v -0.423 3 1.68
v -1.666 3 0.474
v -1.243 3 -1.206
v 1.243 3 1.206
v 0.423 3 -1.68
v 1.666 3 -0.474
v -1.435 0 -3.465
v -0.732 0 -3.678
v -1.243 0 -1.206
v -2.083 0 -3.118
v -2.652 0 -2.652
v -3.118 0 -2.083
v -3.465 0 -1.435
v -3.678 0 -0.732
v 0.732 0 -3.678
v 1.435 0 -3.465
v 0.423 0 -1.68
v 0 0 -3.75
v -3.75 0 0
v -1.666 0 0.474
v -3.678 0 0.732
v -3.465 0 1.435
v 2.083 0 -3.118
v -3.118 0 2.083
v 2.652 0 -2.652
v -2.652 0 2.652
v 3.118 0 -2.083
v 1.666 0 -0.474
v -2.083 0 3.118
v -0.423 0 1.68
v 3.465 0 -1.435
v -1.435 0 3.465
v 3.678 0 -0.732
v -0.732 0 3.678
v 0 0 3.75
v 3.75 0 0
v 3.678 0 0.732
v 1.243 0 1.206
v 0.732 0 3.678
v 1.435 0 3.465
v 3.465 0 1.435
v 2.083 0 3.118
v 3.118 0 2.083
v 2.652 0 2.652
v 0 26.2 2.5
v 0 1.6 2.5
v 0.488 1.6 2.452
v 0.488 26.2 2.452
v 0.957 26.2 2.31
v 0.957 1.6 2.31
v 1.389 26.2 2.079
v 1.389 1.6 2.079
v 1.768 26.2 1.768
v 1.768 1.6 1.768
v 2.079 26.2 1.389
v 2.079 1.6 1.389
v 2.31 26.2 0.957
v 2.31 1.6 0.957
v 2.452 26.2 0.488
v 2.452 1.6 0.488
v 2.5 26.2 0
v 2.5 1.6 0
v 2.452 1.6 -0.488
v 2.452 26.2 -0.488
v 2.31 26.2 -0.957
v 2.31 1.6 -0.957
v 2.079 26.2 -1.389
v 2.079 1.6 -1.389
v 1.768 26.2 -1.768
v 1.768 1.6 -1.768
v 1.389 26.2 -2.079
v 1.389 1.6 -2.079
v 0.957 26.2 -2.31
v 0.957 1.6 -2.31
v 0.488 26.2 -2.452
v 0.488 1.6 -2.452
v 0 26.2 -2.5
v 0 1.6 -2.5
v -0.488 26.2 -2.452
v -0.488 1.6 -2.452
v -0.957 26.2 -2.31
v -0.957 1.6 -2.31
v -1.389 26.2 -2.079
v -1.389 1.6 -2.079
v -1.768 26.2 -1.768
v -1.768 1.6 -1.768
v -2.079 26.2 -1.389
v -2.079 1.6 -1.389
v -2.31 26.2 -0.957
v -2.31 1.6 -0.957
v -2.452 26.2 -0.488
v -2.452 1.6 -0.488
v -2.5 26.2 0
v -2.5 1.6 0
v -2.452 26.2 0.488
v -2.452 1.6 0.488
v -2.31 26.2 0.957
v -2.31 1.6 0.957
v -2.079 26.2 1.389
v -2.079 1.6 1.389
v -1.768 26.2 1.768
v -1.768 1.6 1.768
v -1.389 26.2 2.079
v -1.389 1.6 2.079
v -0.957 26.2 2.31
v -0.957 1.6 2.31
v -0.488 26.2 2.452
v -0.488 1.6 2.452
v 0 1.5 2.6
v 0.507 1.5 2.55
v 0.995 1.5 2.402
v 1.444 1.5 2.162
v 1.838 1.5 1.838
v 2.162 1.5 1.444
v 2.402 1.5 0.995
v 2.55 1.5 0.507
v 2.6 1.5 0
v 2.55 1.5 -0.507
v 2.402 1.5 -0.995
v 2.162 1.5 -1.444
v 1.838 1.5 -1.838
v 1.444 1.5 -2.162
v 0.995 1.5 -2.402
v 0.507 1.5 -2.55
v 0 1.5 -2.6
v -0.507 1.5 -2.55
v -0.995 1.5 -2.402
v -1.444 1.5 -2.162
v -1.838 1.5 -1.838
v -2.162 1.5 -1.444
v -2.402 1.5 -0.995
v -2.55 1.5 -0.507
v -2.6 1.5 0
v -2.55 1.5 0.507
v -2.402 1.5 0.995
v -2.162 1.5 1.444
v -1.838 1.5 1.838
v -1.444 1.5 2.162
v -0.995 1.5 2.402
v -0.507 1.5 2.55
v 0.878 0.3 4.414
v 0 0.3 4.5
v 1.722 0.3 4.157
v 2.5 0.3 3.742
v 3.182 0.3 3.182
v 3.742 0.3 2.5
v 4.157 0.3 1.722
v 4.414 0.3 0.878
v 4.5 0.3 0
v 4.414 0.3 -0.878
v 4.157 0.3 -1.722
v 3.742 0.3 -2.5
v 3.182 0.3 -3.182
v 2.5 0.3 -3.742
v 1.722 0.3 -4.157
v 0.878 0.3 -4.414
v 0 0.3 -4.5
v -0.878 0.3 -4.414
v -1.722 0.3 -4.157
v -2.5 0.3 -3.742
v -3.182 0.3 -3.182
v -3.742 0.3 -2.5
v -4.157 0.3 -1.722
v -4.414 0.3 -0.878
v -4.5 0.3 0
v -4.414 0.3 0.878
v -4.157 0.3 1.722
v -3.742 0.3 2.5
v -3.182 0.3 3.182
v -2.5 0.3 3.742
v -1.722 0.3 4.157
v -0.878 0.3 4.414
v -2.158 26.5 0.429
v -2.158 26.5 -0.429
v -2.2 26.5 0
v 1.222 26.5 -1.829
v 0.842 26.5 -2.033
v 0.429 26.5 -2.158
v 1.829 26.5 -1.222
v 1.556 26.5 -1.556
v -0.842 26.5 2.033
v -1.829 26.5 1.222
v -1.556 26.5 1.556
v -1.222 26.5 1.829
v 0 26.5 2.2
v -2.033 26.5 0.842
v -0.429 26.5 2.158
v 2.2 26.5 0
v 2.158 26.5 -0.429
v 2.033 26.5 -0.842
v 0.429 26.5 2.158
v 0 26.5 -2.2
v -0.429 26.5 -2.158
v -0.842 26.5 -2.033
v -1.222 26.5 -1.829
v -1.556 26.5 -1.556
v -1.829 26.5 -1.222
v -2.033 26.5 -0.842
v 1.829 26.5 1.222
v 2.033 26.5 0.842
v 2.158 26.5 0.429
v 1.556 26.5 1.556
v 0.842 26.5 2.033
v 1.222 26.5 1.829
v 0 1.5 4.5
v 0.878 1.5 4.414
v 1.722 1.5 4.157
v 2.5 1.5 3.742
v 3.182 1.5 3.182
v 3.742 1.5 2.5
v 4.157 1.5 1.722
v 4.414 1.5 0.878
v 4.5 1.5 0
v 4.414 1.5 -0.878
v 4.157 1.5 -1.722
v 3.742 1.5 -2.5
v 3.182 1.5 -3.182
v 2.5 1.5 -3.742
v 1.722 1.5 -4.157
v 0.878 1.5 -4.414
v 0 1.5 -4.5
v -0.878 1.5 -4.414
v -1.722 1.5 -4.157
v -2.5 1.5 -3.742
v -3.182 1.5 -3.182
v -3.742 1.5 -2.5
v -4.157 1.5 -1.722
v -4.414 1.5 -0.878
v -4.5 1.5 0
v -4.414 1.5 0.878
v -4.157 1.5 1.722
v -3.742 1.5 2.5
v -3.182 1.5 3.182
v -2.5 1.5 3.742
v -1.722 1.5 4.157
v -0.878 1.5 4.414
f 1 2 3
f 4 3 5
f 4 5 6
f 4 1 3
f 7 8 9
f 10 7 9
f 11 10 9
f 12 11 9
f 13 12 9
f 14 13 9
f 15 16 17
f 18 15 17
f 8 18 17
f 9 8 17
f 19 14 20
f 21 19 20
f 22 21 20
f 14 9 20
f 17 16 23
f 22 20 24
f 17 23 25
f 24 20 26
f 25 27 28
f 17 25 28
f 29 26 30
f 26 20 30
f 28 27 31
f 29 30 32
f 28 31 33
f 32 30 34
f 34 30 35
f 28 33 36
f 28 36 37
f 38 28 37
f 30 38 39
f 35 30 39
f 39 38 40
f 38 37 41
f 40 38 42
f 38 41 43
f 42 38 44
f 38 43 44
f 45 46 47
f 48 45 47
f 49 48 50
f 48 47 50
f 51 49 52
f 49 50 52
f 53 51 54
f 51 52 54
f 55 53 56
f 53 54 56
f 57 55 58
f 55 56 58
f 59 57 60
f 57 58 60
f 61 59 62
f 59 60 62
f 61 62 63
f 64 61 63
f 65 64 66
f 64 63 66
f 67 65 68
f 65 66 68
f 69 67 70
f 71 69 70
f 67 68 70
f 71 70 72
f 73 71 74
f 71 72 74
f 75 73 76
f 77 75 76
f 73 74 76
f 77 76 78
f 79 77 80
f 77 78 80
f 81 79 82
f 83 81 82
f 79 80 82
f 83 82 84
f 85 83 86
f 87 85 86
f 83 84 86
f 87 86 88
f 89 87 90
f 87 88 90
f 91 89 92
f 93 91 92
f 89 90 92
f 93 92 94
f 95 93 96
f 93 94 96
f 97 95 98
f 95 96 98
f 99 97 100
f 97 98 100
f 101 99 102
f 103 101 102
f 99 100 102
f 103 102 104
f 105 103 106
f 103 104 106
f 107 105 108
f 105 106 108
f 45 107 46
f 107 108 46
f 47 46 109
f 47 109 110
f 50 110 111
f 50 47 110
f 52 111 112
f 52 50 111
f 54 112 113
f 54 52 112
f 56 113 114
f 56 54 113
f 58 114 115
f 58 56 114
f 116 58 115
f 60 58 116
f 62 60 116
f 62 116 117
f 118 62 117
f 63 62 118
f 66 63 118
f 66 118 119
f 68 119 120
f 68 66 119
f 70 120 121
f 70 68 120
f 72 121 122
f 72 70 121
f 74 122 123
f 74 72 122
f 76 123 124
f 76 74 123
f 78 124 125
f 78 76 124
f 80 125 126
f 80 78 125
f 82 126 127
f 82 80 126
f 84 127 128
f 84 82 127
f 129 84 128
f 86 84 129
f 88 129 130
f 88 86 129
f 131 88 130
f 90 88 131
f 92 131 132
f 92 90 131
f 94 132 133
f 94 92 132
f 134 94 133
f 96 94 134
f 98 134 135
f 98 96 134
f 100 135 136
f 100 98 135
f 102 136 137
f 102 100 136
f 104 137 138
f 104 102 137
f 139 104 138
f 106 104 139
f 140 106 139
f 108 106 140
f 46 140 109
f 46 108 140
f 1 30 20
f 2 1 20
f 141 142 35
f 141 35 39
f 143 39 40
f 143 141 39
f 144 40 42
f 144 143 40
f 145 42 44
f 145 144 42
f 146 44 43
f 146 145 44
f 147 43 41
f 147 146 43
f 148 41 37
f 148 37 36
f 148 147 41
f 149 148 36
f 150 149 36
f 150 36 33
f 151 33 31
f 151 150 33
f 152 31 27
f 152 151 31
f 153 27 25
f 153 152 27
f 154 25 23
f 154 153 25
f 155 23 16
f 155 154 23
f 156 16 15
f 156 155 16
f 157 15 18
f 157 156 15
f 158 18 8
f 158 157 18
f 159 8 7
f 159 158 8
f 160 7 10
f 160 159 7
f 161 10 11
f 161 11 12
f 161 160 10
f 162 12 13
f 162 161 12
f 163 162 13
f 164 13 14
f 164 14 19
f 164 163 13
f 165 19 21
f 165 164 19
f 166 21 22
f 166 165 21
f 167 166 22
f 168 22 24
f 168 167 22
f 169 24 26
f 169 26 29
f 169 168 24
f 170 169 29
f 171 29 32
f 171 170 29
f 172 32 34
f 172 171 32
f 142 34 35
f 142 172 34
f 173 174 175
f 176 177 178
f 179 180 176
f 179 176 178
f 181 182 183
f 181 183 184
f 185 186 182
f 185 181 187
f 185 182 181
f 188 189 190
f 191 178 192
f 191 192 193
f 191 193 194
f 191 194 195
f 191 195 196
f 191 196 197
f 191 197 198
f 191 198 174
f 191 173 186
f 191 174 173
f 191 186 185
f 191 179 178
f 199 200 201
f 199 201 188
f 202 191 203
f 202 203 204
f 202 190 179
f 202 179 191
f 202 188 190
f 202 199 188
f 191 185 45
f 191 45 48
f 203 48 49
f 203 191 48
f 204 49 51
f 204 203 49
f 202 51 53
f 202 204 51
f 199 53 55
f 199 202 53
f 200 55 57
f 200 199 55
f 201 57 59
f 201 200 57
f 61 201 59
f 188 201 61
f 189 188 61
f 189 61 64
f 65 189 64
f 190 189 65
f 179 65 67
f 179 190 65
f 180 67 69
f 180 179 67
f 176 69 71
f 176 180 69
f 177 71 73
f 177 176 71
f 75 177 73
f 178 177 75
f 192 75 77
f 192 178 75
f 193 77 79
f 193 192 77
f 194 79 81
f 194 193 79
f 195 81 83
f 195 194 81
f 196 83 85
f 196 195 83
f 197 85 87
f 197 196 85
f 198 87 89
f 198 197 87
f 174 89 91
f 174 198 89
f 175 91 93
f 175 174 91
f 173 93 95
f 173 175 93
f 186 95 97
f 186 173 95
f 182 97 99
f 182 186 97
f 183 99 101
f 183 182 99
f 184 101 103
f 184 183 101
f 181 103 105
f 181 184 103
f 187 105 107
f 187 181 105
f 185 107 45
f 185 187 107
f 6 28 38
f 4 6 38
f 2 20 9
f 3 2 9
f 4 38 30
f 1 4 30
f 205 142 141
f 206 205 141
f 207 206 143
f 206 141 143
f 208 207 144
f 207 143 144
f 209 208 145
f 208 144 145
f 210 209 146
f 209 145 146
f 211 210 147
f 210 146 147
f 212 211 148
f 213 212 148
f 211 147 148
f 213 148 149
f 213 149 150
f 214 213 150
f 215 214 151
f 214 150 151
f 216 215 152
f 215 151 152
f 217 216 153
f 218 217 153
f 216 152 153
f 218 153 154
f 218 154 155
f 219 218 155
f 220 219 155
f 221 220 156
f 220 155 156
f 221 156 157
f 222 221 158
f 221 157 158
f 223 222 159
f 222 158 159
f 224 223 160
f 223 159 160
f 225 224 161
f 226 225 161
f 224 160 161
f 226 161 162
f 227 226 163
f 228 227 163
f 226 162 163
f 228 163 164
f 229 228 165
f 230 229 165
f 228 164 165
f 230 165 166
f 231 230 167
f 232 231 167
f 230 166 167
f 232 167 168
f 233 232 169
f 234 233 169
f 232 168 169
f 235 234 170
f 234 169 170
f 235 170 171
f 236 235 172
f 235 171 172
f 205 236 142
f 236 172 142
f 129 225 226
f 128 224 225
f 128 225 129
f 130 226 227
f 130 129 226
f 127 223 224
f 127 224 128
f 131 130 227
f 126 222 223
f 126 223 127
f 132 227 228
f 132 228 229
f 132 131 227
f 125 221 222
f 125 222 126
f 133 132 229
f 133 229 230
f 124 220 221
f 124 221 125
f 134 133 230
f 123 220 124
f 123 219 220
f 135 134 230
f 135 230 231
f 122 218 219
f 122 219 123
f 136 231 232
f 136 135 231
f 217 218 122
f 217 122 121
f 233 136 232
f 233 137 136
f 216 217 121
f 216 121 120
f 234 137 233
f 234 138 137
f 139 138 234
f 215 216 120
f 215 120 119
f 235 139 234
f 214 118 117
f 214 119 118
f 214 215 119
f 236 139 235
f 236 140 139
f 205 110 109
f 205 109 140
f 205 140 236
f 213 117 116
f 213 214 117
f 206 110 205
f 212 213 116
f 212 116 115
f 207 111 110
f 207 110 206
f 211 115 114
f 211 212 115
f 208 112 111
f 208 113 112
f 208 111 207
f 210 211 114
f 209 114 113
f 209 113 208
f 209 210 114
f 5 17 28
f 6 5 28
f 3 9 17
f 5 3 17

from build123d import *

# Parameters (mm, degrees)
SKETCH2_R           = 4.5
BOSS_EXTRUDE1_DEPTH = 1.5
SKETCH3_R           = 2.5
BOSS_EXTRUDE2_DEPTH = 25
CHAMFER1_SIZE       = 0.1
CHAMFER2_SIZE       = 0.75
CHAMFER2_SIZE2      = 0.3
CUT_EXTRUDE1_DEPTH  = 3
CHAMFER3_SIZE       = 0.3


with BuildPart() as part:
    # Sketch2 → Boss-Extrude1 (new body)
    with BuildSketch(Plane(origin=(0, 0, 0), x_dir=(1, 0, 0), z_dir=(0, 1, 0))):
        Circle(SKETCH2_R)
    extrude(amount=BOSS_EXTRUDE1_DEPTH)

    # Sketch3 → Boss-Extrude2 (add)
    with BuildSketch(Plane(origin=(0, 1.5, 0), x_dir=(1, 0, 0), z_dir=(0, 1, 0))):
        Circle(SKETCH3_R)
    extrude(amount=BOSS_EXTRUDE2_DEPTH)

    # Chamfer1
    chamfer1_edges = [part.edges().sort_by_distance(p)[0] for p in [
        (-2.5, 1.5, 0),
    ]]
    chamfer(chamfer1_edges, length=CHAMFER1_SIZE)

    # Chamfer2
    chamfer2_edges = [part.edges().sort_by_distance(p)[0] for p in [
        (-4.5, 0, 0),
    ]]
    chamfer2_side = [part.faces().sort_by_distance(p)[0] for p in [
        (0, 0, 0),
    ]]
    chamfer(chamfer2_edges, length=CHAMFER2_SIZE, length2=CHAMFER2_SIZE2, reference=chamfer2_side[0])

    # Sketch4 → Cut-Extrude1 (cut)
    with BuildSketch(Plane.XZ):
        Polygon((-0.422737578, 1.679670486), (-1.6660061, 0.473733761), (-1.243268521, -1.205936725), (0.422737578, -1.679670486), (1.6660061, -0.473733761), (1.243268521, 1.205936725), align=None)
    extrude(amount=-CUT_EXTRUDE1_DEPTH, mode=Mode.SUBTRACT)

    # Chamfer3
    chamfer3_edges = [part.edges().sort_by_distance(p)[0] for p in [
        (-2.5, 26.5, 0),
    ]]
    chamfer(chamfer3_edges, length=CHAMFER3_SIZE)


solid = part.part
